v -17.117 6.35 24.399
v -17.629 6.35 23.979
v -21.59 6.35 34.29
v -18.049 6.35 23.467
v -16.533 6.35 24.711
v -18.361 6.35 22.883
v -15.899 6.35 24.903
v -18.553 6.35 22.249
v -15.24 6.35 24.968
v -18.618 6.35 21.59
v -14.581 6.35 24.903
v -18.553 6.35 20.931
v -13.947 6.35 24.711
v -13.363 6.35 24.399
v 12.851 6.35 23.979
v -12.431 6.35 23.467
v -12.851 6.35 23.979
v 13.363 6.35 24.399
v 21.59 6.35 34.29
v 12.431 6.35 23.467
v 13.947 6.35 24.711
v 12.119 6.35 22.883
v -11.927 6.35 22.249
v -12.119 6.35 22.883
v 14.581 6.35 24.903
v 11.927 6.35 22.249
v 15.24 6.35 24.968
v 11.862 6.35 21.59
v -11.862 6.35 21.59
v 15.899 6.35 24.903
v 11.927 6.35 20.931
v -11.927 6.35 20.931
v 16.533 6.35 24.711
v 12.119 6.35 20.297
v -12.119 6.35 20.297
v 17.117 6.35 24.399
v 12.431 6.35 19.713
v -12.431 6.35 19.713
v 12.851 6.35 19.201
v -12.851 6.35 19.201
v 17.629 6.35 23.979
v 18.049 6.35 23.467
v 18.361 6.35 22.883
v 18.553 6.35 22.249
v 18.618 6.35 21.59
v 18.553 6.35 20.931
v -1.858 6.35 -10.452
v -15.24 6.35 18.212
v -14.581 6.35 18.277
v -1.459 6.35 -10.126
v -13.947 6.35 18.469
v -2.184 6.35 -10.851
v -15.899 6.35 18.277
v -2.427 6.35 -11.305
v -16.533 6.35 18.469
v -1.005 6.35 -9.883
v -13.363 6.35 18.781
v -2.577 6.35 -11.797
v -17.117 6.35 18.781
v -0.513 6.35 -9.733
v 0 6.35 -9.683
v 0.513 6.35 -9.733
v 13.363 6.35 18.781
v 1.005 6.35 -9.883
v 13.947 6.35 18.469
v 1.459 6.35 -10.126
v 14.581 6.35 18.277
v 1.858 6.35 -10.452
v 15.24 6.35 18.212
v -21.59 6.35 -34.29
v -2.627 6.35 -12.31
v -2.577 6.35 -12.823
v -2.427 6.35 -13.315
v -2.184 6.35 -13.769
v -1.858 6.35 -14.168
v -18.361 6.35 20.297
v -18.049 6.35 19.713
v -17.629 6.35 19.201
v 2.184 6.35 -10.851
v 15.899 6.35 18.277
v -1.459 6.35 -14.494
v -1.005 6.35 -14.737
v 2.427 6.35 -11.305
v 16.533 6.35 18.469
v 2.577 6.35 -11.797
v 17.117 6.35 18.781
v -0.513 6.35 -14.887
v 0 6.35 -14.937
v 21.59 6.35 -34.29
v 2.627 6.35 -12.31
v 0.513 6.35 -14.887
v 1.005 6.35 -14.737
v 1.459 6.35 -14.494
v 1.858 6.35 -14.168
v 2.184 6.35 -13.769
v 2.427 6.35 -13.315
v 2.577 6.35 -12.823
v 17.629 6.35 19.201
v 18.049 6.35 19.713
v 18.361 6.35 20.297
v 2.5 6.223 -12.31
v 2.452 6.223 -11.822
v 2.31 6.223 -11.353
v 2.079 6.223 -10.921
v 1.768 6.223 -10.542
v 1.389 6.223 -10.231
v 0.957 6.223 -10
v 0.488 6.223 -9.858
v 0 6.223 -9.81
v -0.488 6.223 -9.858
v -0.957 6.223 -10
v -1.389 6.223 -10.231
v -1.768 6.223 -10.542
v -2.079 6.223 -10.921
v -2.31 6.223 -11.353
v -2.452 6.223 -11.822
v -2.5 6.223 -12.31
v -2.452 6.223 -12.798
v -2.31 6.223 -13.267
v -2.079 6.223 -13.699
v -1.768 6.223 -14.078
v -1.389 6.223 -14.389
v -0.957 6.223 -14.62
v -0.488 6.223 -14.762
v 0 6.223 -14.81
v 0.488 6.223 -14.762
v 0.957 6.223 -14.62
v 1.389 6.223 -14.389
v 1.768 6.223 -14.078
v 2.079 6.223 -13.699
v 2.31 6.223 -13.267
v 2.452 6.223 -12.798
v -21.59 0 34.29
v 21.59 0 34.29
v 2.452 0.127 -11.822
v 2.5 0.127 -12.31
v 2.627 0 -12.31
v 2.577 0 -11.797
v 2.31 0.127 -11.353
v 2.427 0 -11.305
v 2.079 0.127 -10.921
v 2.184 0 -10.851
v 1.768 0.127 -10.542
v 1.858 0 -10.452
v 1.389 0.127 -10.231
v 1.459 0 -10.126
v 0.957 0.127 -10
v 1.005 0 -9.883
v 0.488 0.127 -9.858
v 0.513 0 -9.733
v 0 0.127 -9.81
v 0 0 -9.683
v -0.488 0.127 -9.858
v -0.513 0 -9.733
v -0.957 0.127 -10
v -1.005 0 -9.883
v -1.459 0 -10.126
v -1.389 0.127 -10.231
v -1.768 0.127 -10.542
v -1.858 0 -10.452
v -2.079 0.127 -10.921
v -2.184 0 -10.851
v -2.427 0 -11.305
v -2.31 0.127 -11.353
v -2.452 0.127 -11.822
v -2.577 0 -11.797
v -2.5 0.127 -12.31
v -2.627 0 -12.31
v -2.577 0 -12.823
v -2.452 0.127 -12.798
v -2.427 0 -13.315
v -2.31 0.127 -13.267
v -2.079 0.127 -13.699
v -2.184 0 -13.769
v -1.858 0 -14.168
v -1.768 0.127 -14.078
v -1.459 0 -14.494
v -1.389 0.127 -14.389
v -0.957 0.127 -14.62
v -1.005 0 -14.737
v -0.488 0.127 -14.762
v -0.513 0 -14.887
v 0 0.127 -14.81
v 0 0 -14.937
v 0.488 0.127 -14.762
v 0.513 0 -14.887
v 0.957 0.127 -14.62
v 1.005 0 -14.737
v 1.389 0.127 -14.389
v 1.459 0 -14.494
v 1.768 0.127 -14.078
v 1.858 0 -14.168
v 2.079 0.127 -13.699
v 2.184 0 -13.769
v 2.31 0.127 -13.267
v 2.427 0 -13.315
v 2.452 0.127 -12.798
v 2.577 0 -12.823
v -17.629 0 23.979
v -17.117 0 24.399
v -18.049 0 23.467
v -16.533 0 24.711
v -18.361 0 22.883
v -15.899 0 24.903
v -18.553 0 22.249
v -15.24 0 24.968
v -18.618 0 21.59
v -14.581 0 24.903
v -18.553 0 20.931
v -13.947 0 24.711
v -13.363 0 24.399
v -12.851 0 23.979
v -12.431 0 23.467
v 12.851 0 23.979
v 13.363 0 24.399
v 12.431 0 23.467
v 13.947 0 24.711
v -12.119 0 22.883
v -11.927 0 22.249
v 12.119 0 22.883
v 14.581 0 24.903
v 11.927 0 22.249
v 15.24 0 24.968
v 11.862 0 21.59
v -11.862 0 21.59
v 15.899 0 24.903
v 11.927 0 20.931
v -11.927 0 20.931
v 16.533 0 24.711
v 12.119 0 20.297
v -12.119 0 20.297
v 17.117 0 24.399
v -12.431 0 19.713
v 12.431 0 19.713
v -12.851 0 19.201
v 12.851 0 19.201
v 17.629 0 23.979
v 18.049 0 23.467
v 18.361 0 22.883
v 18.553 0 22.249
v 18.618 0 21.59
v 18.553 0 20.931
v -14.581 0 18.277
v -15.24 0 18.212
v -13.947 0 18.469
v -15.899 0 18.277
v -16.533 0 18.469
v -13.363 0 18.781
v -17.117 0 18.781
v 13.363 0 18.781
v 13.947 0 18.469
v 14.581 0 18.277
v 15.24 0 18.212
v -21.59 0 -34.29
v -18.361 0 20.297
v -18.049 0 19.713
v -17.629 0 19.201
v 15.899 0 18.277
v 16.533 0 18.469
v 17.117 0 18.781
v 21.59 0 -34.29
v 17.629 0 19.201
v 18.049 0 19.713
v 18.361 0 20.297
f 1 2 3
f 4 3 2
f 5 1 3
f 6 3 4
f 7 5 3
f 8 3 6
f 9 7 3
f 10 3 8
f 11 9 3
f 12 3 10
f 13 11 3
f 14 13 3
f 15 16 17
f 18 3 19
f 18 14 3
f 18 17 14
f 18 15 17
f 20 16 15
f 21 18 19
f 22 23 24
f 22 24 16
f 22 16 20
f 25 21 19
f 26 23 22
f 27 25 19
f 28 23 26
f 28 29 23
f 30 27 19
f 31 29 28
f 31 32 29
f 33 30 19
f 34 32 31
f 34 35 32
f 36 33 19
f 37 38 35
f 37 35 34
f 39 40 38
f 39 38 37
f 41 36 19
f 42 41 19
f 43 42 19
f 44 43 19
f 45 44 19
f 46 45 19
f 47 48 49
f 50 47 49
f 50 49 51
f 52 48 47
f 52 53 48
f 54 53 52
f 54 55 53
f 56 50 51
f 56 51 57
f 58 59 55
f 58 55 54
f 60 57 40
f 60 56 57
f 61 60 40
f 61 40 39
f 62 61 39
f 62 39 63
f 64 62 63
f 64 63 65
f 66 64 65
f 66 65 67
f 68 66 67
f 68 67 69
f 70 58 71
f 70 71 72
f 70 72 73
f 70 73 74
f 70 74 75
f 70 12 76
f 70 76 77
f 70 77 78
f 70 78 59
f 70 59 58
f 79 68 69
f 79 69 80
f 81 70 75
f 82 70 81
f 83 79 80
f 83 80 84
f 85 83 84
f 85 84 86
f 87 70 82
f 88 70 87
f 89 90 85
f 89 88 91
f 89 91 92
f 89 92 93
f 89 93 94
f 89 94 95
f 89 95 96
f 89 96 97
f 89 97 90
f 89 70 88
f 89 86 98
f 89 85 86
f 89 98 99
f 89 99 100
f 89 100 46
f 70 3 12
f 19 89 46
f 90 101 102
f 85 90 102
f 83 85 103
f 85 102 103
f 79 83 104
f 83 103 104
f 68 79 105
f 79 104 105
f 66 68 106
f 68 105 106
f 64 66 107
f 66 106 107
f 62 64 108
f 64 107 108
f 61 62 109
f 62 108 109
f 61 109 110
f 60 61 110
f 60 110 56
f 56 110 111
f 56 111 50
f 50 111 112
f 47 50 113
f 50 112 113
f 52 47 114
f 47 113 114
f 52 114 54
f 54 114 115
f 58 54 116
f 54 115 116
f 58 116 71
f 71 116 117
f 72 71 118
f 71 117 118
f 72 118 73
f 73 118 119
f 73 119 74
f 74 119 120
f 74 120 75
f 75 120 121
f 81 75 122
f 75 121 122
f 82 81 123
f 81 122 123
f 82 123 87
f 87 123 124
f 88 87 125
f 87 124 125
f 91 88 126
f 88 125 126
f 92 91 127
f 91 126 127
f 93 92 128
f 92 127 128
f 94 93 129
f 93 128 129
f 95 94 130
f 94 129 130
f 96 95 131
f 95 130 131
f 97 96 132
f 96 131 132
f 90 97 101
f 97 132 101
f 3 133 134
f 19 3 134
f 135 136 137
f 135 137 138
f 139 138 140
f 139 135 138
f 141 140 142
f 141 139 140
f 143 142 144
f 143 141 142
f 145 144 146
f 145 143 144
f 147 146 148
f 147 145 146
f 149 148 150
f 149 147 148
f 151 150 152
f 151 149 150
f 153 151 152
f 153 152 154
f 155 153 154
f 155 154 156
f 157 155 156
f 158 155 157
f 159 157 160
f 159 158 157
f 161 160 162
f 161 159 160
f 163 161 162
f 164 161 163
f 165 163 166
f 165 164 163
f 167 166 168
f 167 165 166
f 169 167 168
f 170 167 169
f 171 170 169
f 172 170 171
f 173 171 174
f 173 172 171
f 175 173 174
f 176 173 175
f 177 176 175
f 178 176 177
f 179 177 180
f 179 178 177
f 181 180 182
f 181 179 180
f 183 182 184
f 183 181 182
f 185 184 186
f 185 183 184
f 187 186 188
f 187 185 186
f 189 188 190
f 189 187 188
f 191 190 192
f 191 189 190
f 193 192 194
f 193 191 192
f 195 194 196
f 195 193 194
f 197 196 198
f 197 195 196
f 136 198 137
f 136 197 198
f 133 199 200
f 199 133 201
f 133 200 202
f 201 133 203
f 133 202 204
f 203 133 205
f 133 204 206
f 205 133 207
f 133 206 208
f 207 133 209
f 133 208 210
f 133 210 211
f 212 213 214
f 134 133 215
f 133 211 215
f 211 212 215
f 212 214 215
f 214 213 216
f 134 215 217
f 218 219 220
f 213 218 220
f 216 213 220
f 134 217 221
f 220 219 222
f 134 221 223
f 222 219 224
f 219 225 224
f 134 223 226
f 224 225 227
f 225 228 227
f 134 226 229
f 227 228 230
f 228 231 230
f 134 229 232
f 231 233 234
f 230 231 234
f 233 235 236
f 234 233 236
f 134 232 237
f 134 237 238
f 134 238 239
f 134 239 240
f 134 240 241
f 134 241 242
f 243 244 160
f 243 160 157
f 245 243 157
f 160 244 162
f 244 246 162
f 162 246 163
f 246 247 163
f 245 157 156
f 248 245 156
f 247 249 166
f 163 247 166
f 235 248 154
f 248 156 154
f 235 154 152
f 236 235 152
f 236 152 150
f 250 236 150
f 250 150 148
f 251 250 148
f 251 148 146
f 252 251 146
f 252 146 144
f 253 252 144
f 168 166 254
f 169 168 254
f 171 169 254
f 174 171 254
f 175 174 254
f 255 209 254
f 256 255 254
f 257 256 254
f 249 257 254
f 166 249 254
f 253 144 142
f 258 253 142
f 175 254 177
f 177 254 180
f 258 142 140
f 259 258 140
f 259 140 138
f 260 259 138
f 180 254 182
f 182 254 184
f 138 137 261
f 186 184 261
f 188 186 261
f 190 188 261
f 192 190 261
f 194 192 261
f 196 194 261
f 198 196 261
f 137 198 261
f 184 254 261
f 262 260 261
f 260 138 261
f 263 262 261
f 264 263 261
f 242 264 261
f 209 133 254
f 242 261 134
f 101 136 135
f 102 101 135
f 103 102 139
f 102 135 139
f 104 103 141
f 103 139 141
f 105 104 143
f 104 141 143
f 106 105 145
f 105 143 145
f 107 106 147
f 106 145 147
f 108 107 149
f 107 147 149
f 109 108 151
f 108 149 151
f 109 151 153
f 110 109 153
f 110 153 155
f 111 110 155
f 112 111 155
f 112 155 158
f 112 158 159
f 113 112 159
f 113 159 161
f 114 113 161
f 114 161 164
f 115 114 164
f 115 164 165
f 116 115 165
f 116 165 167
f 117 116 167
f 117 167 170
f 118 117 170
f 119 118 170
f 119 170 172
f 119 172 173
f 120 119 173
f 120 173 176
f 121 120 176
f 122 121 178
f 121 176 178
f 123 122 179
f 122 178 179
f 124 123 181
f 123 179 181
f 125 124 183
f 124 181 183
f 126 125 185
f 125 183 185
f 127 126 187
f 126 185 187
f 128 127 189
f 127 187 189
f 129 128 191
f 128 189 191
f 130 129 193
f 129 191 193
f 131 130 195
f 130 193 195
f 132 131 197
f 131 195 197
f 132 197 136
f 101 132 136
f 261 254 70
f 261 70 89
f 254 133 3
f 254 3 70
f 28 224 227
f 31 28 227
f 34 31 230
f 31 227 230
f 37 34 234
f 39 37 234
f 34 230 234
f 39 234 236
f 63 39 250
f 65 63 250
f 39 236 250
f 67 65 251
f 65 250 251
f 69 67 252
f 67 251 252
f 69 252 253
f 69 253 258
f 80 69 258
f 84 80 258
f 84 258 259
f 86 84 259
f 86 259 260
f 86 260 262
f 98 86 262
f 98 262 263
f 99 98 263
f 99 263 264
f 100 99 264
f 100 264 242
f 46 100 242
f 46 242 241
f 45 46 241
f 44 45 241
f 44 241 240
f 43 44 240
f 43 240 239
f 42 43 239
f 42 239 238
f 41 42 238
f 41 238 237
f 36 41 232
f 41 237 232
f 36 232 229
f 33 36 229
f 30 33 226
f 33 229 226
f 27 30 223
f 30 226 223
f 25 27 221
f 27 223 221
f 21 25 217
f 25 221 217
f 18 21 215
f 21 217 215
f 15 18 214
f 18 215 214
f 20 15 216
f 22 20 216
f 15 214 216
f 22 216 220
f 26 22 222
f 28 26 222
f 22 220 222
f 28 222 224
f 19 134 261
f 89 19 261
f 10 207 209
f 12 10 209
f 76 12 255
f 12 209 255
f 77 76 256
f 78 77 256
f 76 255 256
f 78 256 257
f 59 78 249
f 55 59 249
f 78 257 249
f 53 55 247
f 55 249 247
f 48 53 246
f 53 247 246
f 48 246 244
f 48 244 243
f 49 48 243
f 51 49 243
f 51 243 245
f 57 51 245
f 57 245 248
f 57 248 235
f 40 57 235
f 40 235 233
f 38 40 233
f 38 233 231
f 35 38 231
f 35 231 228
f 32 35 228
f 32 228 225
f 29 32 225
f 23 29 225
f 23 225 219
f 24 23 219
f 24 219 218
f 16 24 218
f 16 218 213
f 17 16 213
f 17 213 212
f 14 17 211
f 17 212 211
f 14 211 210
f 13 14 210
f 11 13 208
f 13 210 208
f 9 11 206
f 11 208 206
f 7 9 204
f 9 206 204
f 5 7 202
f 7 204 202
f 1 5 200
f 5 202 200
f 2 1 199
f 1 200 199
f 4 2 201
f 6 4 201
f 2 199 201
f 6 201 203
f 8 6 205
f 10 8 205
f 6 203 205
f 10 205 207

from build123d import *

# Parameters (mm, degrees)
SKETCH1_W               = 43.18
SKETCH1_H               = 68.58
BOSS_EXTRUDE1_DEPTH     = 6.35
F_1_4_CLEARANCE_HOLE1_D = 6.7564
SKETCH7_R               = 2.5
CUT_EXTRUDE1_DEPTH      = 7.35
CHAMFER1_SIZE           = 0.127


with BuildPart() as part:
    # Sketch1 → Boss-Extrude1 (new body)
    with BuildSketch(Plane(origin=(0, 0, 0), x_dir=(1, 0, 0), z_dir=(0, 1, 0))):
        Rectangle(SKETCH1_W, SKETCH1_H)
    extrude(amount=BOSS_EXTRUDE1_DEPTH)

    # 1/4 Clearance Hole1 (through all)
    with Locations(Plane(origin=(0, 6.35, 0), x_dir=(1, 0, 0), z_dir=(0, 1, 0))):
        with Locations((15.24, -21.59), (-15.24, -21.59)):
            Hole(F_1_4_CLEARANCE_HOLE1_D / 2)

    # Sketch7 → Cut-Extrude1 (cut, through all)
    with BuildSketch(Plane.XZ):
        with Locations((0, -12.31)):
            Circle(SKETCH7_R)
    extrude(amount=-CUT_EXTRUDE1_DEPTH, mode=Mode.SUBTRACT)

    # Chamfer1
    chamfer1_edges = [part.edges().sort_by_distance(p)[0] for p in [
        (-2.5, 6.35, -12.31),
        (-2.5, 0, -12.31),
    ]]
    chamfer(chamfer1_edges, length=CHAMFER1_SIZE)


solid = part.part
